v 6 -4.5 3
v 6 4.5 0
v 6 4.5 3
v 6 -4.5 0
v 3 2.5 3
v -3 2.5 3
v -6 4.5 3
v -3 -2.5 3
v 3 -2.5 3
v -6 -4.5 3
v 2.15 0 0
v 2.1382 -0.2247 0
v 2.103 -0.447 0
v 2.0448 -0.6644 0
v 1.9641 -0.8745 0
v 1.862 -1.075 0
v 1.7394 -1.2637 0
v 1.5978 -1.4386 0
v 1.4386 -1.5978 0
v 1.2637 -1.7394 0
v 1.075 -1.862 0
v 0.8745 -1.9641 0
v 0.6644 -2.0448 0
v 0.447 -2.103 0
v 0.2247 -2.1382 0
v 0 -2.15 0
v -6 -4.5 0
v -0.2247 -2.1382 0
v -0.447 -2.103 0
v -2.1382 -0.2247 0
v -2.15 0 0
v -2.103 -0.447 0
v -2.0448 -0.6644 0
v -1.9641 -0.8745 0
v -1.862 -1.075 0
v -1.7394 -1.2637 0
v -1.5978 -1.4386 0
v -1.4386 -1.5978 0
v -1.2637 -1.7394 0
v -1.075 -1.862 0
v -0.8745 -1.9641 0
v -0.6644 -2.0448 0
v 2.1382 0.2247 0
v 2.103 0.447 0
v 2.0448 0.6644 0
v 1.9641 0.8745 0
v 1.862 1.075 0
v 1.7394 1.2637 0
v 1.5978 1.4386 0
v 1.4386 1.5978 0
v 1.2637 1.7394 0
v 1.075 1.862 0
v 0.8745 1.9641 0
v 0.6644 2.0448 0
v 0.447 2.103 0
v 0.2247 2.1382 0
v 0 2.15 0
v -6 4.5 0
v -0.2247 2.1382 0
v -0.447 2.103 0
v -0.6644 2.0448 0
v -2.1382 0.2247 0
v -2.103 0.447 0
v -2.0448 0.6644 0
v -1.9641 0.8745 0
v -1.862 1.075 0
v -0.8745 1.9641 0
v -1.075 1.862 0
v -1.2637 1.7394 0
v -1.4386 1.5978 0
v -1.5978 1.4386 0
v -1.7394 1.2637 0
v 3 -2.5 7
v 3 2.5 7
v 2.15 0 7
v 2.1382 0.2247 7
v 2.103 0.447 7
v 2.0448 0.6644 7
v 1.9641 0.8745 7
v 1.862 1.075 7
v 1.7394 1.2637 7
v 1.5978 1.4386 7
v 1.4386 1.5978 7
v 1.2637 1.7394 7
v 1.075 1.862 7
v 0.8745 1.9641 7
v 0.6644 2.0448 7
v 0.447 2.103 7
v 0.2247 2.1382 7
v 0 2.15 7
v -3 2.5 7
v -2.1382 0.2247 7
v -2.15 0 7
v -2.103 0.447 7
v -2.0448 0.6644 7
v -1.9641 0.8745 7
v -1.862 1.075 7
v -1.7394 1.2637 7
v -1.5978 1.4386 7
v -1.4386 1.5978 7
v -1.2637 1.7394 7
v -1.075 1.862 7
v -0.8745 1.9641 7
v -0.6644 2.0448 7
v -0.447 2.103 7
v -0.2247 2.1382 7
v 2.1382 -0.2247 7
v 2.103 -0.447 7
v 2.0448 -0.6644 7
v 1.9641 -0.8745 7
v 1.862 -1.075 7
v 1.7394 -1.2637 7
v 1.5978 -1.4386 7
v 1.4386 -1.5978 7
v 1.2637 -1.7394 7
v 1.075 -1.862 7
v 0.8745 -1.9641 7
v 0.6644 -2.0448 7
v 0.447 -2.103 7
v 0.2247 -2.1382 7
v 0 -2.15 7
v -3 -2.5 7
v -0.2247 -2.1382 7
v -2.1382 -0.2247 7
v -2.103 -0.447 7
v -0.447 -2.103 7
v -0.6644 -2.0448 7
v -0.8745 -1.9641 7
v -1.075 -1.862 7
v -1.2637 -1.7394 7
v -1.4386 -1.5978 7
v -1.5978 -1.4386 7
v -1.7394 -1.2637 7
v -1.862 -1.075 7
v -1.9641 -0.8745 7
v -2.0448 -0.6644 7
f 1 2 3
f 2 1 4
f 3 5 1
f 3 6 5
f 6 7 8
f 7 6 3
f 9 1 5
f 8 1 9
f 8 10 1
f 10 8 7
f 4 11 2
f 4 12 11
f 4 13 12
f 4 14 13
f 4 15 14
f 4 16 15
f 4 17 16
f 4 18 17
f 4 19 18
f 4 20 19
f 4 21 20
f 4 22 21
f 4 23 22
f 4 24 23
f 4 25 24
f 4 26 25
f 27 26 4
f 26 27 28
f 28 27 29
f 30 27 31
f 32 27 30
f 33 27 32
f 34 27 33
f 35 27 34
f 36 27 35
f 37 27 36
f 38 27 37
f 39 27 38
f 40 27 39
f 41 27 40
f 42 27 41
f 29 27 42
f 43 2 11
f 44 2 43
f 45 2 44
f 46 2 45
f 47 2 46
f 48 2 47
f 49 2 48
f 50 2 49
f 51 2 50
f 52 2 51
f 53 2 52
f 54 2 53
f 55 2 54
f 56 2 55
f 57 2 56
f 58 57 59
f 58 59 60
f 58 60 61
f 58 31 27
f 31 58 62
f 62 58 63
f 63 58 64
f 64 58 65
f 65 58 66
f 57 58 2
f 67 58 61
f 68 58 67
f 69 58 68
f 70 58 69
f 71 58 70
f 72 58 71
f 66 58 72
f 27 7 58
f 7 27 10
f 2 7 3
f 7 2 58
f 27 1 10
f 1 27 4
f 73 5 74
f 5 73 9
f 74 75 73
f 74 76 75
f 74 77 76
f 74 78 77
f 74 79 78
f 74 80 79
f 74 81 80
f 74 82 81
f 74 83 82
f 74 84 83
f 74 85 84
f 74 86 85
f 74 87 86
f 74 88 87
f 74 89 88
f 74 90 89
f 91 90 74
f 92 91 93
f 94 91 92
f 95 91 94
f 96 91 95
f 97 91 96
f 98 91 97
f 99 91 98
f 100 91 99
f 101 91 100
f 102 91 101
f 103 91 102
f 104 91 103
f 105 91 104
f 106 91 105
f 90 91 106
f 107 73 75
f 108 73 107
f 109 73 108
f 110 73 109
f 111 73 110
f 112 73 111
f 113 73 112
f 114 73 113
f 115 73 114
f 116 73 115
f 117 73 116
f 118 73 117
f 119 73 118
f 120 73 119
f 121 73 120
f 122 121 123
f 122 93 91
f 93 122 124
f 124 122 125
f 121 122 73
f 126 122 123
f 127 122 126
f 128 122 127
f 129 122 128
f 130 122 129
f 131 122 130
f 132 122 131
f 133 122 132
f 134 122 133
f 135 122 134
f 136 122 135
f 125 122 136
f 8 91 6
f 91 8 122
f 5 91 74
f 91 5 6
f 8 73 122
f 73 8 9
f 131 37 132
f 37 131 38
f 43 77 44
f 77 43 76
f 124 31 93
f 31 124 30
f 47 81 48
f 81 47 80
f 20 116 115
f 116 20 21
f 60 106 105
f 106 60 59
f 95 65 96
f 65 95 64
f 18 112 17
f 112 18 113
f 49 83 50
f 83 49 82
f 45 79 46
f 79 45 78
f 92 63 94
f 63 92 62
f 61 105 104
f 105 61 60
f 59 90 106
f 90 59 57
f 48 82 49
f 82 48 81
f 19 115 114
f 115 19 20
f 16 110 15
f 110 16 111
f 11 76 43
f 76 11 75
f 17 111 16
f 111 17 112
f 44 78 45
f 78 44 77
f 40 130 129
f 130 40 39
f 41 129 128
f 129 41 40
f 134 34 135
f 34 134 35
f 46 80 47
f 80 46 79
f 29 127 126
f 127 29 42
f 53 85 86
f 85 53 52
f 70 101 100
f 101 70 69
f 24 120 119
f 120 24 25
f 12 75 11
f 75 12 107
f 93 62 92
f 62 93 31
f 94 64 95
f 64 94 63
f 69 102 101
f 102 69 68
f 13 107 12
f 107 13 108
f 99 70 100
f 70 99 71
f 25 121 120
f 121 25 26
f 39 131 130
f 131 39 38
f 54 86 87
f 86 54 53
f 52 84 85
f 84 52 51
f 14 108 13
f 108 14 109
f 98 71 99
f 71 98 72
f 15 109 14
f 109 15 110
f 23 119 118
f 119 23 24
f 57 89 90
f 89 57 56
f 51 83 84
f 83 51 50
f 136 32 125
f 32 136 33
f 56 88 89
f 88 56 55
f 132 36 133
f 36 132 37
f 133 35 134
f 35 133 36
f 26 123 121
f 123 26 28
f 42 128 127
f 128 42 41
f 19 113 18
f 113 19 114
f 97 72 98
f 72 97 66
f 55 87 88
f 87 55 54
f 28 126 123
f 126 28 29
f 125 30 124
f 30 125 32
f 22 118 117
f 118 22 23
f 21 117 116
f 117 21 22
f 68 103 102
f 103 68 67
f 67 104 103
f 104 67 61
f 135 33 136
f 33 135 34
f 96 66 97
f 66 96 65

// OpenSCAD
// T-slot nut for aluminium extrusion.
$fn = 60;
eps = 0.02;
slot_w = 5;
thread_d = 4.3;
length = 12;
body_w = slot_w + 4;
body_h = 7;
difference() {
    union() {
        translate([-length / 2, -body_w / 2, 0]) cube([length, body_w, 3]);
        translate([-length / 2 + 3, -slot_w / 2, 3]) cube([length - 6, slot_w, body_h - 3]);
    }
    translate([0, 0, -eps]) cylinder(d = thread_d, h = body_h + 2 * eps);
}
